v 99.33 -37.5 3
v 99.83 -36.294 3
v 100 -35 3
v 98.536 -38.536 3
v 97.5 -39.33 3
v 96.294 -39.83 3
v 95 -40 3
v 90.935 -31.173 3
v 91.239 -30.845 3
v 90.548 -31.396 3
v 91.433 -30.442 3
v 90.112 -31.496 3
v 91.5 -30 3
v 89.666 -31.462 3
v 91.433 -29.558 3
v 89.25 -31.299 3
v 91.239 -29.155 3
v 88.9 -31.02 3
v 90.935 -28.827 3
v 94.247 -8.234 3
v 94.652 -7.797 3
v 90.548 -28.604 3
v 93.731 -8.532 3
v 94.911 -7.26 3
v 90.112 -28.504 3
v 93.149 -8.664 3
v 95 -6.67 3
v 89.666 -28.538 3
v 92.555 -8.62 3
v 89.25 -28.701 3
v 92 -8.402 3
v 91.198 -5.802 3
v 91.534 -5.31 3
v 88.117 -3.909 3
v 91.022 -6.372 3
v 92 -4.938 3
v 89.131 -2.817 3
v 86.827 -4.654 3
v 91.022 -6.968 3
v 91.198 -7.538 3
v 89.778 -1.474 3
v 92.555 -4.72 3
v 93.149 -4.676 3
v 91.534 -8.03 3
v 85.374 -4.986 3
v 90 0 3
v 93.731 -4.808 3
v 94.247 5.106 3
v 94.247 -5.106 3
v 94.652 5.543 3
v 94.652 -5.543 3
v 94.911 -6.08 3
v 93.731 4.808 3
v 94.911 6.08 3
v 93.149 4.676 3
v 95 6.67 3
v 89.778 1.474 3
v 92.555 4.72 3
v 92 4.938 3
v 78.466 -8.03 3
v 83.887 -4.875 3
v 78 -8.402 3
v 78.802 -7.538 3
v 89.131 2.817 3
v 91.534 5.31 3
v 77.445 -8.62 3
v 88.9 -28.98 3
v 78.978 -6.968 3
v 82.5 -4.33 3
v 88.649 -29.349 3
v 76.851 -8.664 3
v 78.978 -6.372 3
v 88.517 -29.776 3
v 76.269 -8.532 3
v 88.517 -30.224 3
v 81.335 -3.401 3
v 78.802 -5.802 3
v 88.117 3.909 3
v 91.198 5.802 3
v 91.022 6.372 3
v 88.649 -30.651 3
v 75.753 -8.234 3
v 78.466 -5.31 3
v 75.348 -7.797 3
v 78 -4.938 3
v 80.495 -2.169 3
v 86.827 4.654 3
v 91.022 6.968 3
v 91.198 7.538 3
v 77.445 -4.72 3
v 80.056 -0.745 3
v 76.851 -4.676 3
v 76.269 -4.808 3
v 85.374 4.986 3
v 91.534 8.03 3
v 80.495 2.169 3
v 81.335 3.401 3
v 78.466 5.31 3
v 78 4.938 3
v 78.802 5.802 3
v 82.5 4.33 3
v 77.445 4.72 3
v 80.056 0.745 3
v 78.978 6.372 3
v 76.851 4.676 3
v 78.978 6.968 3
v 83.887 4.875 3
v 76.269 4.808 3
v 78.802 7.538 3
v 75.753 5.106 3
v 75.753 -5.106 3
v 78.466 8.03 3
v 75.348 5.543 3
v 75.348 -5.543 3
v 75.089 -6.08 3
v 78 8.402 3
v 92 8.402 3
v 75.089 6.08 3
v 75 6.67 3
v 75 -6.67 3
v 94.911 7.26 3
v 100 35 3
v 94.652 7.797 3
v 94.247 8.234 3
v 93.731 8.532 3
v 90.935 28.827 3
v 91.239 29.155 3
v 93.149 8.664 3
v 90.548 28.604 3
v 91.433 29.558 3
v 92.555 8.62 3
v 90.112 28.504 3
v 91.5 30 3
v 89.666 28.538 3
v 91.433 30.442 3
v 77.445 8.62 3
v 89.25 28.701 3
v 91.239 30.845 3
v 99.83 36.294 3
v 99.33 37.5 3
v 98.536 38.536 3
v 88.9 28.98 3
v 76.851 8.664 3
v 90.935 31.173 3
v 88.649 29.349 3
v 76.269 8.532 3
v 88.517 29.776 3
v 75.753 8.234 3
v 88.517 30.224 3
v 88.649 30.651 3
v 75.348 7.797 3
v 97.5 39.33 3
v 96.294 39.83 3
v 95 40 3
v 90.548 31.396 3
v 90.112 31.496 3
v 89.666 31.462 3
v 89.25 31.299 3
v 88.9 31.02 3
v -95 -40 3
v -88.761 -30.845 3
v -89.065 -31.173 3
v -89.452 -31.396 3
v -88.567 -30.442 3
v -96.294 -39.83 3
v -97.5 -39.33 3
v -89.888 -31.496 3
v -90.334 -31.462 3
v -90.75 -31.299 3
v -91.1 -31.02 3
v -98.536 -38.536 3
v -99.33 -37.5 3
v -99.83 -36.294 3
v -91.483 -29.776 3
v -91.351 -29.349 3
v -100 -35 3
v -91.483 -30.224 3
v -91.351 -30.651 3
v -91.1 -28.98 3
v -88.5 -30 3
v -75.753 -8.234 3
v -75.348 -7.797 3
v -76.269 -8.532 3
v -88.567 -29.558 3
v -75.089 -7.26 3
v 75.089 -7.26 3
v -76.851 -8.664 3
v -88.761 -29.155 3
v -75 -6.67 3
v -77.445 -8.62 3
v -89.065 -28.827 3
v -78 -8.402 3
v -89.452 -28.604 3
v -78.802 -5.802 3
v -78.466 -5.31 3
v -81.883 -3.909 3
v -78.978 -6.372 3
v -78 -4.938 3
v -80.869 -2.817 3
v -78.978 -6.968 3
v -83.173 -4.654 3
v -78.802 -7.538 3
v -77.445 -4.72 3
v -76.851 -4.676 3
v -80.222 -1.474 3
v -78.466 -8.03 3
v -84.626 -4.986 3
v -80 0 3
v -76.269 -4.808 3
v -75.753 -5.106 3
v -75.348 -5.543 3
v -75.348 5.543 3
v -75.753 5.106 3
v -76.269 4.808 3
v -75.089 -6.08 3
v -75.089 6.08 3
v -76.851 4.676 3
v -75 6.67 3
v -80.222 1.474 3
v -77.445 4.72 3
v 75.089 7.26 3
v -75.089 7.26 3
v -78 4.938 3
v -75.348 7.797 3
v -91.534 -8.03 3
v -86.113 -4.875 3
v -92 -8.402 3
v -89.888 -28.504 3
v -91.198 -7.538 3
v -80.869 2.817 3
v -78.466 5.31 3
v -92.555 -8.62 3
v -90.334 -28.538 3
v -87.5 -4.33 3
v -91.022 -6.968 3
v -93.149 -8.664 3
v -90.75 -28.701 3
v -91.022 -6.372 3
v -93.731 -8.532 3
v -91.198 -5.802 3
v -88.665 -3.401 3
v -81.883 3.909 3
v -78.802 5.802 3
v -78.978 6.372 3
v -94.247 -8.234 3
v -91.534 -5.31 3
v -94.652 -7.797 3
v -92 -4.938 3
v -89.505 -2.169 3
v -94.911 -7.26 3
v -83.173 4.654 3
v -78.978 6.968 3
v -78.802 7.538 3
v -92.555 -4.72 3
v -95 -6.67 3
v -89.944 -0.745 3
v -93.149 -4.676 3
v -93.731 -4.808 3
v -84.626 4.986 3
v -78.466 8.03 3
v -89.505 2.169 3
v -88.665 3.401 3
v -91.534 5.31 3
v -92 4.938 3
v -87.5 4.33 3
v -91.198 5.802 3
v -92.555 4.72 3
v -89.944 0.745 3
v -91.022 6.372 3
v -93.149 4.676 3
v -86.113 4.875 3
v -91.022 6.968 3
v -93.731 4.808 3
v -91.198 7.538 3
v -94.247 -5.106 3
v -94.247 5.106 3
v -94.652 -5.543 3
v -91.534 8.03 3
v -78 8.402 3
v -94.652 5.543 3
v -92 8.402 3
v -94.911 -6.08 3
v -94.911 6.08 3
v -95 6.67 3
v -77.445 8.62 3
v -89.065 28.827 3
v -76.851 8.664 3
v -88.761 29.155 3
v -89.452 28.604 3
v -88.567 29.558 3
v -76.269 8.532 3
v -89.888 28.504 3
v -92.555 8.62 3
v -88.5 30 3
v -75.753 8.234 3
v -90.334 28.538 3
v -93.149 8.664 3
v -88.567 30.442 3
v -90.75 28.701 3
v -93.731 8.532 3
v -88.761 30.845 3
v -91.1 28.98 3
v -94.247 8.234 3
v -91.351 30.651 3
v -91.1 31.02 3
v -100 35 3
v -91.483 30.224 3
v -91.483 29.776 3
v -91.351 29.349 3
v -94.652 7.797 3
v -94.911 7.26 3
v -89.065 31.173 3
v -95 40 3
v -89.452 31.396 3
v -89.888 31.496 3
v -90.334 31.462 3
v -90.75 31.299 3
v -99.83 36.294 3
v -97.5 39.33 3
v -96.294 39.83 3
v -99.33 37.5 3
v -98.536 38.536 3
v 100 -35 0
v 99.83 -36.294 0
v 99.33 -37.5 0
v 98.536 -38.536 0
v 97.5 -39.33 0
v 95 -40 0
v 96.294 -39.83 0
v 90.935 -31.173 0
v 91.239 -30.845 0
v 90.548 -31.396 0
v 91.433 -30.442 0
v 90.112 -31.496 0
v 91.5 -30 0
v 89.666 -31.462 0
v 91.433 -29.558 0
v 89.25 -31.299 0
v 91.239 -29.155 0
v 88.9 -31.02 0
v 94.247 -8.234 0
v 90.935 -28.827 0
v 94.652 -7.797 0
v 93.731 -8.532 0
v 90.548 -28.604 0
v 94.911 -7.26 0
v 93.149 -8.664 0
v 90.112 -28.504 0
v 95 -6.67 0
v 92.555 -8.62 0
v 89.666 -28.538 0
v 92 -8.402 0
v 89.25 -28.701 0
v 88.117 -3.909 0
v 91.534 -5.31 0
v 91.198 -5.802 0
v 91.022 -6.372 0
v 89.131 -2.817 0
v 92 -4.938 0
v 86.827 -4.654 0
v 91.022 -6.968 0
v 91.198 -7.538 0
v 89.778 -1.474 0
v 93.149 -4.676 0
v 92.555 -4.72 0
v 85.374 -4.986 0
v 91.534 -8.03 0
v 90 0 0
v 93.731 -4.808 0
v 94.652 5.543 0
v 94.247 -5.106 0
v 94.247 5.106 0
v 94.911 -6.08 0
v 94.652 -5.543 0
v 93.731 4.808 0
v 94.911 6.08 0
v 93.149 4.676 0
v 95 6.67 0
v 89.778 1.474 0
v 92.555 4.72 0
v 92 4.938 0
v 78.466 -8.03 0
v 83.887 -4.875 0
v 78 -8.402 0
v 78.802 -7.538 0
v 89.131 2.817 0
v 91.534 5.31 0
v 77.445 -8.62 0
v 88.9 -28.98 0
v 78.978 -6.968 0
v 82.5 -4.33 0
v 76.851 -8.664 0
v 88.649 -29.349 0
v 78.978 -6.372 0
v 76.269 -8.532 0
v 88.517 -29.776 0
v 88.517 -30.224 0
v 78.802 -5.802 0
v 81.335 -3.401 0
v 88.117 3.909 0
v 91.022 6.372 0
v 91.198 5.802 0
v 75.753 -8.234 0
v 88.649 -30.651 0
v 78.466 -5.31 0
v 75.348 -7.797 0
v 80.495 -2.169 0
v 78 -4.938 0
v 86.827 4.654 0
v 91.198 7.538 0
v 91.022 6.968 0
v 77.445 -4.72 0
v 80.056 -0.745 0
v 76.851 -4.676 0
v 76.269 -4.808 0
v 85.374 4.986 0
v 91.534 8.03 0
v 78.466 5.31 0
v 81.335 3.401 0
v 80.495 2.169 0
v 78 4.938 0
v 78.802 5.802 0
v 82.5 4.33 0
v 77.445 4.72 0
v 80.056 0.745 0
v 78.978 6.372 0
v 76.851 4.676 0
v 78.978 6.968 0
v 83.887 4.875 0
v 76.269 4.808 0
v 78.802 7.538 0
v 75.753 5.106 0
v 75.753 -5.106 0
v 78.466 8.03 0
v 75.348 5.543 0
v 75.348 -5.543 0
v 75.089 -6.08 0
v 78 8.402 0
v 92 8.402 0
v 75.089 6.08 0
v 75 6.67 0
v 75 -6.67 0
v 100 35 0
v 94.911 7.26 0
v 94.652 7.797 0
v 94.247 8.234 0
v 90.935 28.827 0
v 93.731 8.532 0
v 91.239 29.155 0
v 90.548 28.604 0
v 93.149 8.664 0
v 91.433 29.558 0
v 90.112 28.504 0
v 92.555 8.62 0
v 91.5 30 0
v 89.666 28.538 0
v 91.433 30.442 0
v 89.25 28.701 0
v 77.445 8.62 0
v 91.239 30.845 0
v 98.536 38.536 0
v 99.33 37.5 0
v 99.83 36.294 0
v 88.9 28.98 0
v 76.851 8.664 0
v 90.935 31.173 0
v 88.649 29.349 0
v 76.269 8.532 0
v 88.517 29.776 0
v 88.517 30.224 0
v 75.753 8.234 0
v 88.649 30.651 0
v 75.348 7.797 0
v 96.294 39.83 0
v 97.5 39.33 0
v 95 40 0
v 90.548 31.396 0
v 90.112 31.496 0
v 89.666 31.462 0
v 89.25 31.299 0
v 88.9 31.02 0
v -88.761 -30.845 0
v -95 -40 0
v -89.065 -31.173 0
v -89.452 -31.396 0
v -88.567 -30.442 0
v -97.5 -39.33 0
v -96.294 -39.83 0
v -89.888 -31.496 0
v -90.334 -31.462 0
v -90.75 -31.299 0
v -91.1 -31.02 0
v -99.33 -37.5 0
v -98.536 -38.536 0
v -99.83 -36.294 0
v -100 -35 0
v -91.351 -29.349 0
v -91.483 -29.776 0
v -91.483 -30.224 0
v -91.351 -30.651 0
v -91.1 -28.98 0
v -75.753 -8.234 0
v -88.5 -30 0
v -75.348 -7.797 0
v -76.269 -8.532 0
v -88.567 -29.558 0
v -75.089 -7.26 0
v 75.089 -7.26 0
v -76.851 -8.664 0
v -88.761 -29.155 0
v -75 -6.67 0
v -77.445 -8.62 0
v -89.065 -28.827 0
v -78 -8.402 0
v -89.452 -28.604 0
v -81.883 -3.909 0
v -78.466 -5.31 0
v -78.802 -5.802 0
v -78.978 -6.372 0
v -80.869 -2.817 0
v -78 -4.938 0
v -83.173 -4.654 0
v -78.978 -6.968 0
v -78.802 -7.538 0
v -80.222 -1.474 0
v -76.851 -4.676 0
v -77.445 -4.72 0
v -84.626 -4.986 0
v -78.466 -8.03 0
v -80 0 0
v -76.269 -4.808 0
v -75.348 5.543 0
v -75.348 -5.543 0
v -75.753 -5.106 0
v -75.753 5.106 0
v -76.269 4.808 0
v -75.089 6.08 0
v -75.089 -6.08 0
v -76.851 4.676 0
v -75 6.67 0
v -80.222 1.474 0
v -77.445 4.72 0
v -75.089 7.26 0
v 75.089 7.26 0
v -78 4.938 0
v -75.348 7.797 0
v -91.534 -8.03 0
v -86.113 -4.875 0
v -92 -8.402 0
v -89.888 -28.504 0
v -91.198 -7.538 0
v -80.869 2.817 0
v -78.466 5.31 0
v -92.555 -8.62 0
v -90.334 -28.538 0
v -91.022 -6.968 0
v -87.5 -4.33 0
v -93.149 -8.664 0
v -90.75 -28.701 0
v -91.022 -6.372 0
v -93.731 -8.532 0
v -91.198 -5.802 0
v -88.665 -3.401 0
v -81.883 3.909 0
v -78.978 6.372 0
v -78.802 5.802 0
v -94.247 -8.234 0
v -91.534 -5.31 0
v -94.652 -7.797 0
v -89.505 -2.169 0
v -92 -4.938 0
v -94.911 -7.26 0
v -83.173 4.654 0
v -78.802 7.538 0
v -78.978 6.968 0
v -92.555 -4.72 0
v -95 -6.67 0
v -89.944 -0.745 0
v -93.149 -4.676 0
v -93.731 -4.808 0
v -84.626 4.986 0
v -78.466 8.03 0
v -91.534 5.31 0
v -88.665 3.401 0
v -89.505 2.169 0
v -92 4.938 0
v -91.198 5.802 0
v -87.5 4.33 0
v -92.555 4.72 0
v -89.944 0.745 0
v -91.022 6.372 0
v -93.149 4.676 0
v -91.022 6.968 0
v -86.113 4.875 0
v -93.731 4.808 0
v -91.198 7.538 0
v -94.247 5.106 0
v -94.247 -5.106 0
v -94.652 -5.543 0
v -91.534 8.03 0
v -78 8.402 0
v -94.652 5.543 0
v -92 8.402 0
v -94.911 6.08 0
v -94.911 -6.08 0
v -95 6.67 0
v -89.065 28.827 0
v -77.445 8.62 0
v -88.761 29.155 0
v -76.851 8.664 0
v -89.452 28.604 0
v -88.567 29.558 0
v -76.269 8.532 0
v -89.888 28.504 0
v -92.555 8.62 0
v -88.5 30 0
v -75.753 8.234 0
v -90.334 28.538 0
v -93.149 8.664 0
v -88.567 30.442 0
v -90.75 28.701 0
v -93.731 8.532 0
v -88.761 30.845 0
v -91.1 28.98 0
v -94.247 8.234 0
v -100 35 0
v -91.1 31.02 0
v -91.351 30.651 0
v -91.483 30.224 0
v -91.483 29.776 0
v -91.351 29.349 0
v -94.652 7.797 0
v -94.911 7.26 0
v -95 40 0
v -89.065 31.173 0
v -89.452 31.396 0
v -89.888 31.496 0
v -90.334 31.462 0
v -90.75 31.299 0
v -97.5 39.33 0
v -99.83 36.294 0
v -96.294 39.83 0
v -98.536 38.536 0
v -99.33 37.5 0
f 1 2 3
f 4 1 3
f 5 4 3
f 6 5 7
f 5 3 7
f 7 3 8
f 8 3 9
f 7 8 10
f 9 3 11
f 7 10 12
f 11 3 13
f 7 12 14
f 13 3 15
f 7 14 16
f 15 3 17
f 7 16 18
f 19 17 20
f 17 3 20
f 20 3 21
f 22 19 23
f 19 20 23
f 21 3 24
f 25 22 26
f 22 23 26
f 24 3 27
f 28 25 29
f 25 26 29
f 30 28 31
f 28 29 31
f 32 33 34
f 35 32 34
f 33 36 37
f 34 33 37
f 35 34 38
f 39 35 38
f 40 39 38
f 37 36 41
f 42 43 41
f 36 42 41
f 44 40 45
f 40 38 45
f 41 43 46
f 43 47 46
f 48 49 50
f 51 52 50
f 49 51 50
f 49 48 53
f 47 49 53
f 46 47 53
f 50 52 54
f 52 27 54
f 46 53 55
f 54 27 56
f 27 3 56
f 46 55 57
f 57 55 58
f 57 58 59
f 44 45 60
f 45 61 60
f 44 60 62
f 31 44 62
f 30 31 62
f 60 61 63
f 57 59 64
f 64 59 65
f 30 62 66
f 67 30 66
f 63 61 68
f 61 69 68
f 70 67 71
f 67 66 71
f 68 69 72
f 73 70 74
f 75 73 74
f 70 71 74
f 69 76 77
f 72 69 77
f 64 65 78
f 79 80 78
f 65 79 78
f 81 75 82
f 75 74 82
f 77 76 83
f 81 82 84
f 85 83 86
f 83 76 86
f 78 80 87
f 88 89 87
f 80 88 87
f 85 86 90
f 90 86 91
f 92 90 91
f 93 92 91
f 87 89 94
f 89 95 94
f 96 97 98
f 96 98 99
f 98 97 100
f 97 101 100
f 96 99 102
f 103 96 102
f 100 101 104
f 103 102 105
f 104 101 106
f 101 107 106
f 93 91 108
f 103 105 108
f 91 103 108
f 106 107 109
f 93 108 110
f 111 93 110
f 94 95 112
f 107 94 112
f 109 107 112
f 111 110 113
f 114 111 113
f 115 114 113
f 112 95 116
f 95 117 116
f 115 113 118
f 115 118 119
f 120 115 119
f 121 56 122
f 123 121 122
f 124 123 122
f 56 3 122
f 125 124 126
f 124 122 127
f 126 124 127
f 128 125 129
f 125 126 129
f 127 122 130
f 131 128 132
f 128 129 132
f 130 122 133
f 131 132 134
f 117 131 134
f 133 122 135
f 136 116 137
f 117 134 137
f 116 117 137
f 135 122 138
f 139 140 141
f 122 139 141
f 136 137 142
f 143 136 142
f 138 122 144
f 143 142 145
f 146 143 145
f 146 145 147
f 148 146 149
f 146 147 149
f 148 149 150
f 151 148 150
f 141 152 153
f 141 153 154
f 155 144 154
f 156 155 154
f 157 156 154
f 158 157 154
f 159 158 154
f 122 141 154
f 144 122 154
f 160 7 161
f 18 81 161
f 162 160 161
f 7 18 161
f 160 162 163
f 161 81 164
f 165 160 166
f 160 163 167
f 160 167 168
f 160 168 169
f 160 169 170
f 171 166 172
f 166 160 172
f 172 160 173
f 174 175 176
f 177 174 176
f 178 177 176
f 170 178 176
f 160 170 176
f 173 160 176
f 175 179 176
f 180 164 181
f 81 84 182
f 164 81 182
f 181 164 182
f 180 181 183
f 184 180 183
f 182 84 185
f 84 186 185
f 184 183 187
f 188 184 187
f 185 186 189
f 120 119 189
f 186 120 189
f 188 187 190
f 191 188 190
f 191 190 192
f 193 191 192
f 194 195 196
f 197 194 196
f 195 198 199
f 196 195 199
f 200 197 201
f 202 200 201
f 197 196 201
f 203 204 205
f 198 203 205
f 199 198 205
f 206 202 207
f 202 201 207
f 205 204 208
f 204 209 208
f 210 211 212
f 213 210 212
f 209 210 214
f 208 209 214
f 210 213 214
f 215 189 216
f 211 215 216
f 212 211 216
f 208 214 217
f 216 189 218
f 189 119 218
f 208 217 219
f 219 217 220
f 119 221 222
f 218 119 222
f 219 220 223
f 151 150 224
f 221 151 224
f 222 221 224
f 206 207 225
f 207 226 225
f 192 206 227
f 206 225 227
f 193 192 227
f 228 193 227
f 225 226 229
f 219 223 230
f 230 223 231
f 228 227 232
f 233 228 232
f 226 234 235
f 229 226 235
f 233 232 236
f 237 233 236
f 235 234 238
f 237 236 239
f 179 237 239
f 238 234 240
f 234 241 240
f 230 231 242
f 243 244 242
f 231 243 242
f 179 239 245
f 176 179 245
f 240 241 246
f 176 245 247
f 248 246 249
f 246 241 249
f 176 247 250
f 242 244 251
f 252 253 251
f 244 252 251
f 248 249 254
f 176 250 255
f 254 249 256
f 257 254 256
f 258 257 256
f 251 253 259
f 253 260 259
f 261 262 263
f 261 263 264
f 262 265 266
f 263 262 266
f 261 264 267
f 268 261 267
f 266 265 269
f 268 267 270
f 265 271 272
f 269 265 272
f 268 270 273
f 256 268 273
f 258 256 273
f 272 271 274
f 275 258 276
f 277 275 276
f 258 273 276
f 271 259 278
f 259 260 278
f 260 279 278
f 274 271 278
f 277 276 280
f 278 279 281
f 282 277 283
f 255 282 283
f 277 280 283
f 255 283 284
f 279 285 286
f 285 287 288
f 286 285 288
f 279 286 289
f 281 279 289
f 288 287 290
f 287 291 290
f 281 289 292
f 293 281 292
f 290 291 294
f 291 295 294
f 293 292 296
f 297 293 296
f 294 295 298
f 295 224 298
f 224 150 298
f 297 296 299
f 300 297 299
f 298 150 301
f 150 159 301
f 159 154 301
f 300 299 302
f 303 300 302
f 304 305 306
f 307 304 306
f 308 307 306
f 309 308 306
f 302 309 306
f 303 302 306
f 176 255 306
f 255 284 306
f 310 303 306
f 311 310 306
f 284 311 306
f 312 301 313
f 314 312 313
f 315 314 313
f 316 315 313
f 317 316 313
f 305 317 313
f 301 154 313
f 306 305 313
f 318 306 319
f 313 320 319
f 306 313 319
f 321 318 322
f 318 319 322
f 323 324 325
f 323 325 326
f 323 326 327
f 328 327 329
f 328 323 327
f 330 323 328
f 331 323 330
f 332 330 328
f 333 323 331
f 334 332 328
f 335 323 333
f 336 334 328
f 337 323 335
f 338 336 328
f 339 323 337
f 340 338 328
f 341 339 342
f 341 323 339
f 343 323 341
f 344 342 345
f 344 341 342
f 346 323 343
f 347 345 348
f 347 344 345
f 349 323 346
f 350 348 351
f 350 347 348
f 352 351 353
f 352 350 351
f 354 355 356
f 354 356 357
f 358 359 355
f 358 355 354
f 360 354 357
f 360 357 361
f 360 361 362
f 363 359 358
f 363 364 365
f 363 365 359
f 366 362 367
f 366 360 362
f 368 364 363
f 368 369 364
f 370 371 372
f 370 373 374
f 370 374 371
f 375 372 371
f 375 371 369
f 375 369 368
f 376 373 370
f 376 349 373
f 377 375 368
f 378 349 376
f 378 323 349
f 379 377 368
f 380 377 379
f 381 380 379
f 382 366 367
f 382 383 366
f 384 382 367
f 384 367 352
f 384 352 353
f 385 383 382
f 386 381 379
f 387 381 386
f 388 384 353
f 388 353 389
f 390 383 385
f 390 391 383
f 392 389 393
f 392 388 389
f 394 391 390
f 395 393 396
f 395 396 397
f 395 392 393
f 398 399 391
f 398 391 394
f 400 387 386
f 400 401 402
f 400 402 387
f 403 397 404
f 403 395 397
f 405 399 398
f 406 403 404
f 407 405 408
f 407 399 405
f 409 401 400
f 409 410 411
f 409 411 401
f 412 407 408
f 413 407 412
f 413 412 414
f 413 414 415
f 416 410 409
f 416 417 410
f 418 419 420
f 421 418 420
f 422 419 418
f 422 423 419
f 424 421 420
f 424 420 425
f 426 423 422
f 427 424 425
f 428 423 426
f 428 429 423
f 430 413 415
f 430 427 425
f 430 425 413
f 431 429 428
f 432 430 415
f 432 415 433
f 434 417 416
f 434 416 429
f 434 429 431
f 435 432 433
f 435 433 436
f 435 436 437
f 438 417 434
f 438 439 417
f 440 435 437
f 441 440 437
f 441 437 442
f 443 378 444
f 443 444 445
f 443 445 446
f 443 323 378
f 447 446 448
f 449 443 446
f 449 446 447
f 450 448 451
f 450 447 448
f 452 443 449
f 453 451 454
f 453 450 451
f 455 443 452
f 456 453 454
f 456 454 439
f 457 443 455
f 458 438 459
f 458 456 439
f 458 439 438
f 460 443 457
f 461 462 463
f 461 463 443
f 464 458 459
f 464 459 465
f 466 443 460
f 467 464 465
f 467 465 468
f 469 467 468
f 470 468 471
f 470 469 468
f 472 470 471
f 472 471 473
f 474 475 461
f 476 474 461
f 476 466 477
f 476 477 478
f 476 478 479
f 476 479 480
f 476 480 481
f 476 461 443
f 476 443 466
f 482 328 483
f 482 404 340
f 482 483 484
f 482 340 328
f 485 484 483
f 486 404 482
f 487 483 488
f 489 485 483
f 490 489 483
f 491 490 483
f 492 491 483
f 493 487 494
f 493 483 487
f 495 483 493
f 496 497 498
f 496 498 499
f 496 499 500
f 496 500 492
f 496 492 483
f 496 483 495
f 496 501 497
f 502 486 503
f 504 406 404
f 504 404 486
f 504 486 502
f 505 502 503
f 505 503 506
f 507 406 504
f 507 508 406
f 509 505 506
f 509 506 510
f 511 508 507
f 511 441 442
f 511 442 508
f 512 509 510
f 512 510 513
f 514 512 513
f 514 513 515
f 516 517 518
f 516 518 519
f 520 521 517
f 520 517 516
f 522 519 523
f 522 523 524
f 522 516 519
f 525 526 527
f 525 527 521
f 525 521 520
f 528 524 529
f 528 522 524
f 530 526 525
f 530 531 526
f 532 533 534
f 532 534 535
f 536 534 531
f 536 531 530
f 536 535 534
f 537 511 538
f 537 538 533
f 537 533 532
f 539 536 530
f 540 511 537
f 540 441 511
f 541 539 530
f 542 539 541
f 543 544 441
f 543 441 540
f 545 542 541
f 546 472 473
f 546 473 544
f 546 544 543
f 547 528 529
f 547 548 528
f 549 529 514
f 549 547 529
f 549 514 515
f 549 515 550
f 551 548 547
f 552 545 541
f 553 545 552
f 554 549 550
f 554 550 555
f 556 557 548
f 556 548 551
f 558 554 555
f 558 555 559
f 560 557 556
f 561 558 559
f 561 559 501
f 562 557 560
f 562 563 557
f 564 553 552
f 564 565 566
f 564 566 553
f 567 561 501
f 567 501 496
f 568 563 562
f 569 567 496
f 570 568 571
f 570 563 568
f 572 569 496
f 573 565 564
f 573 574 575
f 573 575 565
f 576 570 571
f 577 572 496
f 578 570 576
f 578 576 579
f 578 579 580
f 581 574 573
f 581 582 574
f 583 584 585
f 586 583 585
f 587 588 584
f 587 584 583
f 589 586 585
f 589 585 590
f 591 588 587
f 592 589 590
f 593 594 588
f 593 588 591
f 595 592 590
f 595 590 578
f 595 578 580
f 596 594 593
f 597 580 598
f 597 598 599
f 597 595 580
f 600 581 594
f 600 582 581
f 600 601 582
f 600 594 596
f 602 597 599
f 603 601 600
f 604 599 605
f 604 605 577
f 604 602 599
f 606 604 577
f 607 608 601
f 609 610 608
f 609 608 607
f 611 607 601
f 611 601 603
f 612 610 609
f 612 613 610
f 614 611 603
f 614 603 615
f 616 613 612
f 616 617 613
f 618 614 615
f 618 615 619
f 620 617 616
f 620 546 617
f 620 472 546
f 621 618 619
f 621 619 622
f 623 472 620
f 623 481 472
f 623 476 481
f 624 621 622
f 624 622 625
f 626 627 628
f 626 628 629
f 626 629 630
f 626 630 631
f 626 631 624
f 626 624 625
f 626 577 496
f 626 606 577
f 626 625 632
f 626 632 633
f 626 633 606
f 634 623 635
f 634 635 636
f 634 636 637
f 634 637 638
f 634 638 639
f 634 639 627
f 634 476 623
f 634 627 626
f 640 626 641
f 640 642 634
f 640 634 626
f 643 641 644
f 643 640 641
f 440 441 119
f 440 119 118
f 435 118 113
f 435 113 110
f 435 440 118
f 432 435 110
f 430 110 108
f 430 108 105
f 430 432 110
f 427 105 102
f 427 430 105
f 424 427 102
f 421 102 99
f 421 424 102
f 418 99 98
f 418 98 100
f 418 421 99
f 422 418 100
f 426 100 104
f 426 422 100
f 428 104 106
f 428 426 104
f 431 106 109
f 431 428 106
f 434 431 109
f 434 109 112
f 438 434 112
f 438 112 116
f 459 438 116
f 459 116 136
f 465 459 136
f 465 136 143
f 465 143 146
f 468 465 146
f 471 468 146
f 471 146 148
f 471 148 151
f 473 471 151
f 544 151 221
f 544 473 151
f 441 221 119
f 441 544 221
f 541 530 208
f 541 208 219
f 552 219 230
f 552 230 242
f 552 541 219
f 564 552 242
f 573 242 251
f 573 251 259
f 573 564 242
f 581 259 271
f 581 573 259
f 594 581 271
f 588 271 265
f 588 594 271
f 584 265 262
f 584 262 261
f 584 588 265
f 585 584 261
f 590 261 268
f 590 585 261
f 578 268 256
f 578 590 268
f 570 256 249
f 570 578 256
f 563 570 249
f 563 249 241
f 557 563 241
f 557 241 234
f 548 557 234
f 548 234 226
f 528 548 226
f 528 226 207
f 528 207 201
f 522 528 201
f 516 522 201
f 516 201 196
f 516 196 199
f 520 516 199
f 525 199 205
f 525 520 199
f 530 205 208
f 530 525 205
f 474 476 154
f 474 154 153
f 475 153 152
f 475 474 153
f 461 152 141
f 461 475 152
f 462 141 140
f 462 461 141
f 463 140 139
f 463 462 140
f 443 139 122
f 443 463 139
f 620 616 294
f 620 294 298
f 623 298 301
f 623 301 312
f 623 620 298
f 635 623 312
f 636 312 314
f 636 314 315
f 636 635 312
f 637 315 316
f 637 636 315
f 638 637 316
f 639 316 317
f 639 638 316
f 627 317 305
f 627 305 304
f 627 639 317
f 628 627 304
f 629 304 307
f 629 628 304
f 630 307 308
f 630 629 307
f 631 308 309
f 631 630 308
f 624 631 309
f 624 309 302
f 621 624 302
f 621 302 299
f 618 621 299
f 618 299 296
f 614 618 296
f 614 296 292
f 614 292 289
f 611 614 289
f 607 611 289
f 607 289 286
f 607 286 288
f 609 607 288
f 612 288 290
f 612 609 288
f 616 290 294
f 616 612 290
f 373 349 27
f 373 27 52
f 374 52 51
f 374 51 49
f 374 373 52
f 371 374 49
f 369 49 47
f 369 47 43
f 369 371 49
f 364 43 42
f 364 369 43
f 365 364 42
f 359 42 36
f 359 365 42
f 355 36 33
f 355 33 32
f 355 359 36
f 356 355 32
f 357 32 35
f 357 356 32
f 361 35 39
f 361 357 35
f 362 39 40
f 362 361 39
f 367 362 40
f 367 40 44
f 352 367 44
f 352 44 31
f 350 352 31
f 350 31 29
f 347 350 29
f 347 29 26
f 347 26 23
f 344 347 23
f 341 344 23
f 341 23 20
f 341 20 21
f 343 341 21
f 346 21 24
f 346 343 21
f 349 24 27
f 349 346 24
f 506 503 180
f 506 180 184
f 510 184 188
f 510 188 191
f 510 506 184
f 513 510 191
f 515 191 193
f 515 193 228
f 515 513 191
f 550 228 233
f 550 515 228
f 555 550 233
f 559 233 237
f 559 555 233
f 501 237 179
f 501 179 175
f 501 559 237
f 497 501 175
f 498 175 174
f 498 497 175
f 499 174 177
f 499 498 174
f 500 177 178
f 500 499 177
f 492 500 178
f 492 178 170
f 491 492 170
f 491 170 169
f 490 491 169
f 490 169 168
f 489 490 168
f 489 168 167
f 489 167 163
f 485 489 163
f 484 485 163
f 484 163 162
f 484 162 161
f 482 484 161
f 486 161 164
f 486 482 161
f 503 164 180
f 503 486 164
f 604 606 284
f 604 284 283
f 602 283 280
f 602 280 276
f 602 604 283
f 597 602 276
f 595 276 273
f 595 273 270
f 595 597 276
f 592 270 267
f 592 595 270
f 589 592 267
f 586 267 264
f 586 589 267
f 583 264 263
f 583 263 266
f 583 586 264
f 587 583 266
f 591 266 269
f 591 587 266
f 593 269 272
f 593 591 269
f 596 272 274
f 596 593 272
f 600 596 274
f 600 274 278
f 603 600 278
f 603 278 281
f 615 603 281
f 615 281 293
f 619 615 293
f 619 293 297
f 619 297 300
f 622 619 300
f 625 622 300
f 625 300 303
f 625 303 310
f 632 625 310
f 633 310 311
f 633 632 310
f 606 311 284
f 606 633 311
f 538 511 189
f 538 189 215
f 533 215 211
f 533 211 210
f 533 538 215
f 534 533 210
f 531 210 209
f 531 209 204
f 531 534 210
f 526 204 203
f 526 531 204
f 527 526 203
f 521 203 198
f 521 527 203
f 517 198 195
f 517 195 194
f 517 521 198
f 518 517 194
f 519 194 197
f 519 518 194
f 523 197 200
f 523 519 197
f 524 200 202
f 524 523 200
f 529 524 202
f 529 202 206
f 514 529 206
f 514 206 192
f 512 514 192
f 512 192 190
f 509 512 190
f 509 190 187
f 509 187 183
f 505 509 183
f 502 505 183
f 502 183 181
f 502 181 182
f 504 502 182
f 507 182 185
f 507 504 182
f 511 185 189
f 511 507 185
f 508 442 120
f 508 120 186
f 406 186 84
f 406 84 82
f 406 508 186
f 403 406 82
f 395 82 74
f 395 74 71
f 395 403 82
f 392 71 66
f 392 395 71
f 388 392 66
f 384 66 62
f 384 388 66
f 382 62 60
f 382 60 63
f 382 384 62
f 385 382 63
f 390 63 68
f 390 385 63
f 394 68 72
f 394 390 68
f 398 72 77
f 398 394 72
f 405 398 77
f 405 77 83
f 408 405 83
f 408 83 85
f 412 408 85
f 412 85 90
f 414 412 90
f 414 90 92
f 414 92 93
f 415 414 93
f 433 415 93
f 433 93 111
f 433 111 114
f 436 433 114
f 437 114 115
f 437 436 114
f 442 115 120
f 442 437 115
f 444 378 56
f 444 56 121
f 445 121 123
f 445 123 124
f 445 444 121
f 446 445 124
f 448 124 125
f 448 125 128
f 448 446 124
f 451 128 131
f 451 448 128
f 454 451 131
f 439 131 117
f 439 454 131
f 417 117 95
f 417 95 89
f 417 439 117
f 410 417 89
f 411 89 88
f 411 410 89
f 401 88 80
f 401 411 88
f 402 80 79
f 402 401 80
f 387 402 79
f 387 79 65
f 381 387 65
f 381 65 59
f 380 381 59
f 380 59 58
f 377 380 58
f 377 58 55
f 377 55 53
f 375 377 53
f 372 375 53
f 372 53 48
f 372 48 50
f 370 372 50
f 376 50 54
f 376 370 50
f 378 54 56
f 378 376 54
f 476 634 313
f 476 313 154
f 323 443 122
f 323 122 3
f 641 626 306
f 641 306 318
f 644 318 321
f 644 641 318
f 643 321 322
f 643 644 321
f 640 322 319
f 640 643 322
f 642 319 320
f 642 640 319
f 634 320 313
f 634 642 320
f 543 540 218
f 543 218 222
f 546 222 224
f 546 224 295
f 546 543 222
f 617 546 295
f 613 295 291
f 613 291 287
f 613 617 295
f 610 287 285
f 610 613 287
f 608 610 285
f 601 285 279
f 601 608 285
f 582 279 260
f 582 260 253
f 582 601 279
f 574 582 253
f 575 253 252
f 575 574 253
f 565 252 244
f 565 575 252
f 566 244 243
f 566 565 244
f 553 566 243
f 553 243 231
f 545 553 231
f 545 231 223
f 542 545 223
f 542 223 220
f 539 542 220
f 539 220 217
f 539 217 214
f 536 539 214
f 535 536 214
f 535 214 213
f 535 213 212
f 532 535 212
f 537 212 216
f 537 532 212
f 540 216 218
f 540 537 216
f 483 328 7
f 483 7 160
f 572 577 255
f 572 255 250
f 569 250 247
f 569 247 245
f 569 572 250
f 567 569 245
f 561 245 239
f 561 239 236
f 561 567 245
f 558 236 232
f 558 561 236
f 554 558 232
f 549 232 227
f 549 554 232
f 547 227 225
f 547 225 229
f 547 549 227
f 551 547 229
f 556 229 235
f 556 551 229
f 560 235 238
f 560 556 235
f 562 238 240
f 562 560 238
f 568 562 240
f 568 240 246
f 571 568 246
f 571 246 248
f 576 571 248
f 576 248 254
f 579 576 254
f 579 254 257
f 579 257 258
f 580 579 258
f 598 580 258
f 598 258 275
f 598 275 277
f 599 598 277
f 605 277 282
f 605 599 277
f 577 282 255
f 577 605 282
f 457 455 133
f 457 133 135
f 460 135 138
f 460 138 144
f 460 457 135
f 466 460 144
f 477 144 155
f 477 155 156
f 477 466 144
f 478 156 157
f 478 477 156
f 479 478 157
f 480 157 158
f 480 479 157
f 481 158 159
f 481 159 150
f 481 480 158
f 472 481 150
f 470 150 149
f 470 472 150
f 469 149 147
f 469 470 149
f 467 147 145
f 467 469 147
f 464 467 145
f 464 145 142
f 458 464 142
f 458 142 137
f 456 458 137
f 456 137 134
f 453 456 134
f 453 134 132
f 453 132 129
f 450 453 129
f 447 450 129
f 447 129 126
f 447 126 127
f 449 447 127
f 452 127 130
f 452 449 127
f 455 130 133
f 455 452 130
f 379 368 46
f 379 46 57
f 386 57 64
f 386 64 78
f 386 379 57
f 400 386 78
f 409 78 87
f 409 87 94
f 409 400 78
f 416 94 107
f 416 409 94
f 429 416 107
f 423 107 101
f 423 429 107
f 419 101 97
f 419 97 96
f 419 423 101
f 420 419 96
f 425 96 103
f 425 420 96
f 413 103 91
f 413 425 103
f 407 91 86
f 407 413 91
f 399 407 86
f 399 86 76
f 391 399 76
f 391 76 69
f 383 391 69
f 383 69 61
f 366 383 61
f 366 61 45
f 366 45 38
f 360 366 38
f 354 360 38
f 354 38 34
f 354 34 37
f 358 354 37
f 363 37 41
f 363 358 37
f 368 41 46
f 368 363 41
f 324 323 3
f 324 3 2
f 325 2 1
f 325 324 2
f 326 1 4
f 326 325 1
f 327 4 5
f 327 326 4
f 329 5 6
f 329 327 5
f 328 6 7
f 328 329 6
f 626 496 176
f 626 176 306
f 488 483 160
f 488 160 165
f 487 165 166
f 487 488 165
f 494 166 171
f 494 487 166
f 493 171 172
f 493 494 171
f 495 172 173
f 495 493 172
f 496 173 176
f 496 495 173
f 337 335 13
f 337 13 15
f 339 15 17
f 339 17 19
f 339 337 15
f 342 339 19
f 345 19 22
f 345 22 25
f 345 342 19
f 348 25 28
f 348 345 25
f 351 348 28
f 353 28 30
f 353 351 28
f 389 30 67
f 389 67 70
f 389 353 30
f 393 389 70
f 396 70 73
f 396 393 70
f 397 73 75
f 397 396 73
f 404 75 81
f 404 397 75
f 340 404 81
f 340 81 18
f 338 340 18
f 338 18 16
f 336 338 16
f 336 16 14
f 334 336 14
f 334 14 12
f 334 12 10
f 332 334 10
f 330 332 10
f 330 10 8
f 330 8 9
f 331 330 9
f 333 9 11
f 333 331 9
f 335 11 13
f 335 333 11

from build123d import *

# Parameters (mm, degrees)
ESBO_O1_R                = 1.5
ESBO_O1_R_2              = 5
ESBO_O1_R_3              = 2
RESSALTO_EXTRUS_O1_DEPTH = 3


with BuildPart() as part:
    # Esboço1 → Ressalto-extrusão1 (new body)
    with BuildSketch(Plane.XY):
        with BuildLine():
            Line((95, -40), (-95, -40))
            ThreePointArc((-95, -40), (-98.535533906, -38.535533906), (-100, -35))
            Line((-100, -35), (-100, 35))
            ThreePointArc((-100, 35), (-98.535533906, 38.535533906), (-95, 40))
            Line((-95, 40), (95, 40))
            ThreePointArc((95, 40), (98.535533906, 38.535533906), (100, 35))
            Line((100, 35), (100, -35))
            ThreePointArc((100, -35), (98.535533906, -38.535533906), (95, -40))
        make_face()
        with Locations((-90, 30)):
            Circle(ESBO_O1_R, mode=Mode.SUBTRACT)
        with Locations((90, 30)):
            Circle(ESBO_O1_R, mode=Mode.SUBTRACT)
        with Locations((90, -30)):
            Circle(ESBO_O1_R, mode=Mode.SUBTRACT)
        with Locations((-90, -30)):
            Circle(ESBO_O1_R, mode=Mode.SUBTRACT)
        with Locations((-85, 0)):
            Circle(ESBO_O1_R_2, mode=Mode.SUBTRACT)
        with Locations((85, 0)):
            Circle(ESBO_O1_R_2, mode=Mode.SUBTRACT)
        with Locations((93, 6.67)):
            Circle(ESBO_O1_R_3, mode=Mode.SUBTRACT)
        with Locations((93, -6.67)):
            Circle(ESBO_O1_R_3, mode=Mode.SUBTRACT)
        with Locations(Location((77, -6.67, 0), (0, 0, 180))):
            Circle(ESBO_O1_R_3, mode=Mode.SUBTRACT)
        with Locations(Location((77, 6.67, 0), (0, 0, 180))):
            Circle(ESBO_O1_R_3, mode=Mode.SUBTRACT)
        with Locations((-77, -6.67)):
            Circle(ESBO_O1_R_3, mode=Mode.SUBTRACT)
        with Locations(Location((-93, -6.67, 0), (0, 0, 180))):
            Circle(ESBO_O1_R_3, mode=Mode.SUBTRACT)
        with Locations(Location((-93, 6.67, 0), (0, 0, 180))):
            Circle(ESBO_O1_R_3, mode=Mode.SUBTRACT)
        with Locations((-77, 6.67)):
            Circle(ESBO_O1_R_3, mode=Mode.SUBTRACT)
    extrude(amount=RESSALTO_EXTRUS_O1_DEPTH)


solid = part.part
